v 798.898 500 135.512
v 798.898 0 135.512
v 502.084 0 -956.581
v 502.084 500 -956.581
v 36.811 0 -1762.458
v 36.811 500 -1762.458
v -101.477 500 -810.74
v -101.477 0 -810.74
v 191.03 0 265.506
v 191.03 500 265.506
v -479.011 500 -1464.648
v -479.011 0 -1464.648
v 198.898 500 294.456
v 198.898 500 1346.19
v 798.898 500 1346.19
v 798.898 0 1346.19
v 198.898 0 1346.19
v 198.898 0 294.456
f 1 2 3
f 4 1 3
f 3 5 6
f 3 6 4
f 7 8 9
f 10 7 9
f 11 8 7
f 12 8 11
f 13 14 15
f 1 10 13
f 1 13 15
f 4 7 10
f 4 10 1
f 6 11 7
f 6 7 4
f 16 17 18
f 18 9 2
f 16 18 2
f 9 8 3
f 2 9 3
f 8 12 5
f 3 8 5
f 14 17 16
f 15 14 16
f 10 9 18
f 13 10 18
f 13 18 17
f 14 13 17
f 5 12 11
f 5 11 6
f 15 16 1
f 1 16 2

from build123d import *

# Parameters (mm, degrees)
BOSS_EXTRUDE1_DEPTH = 500
BOSS_EXTRUDE2_DEPTH = 500


with BuildPart() as part:
    # Sketch1 → Boss-Extrude1 (new body)
    with BuildSketch(Plane(origin=(0, 0, 0), x_dir=(1, 0, 0), z_dir=(0, 1, 0))):
        Polygon((-479.010759858, 1464.647663661), (-101.47714403, 810.74025948), (502.083882717, 956.5813546), (36.811056846, 1762.457528389), align=None)
    extrude(amount=BOSS_EXTRUDE1_DEPTH)

    # Sketch1_3 → Boss-Extrude2 (add)
    with BuildSketch(Plane(origin=(0, 0, 0), x_dir=(1, 0, 0), z_dir=(0, 1, 0))):
        Polygon((798.89792549, -1346.189835627), (798.89792549, -135.512175948), (502.083882717, 956.5813546), (-101.47714403, 810.74025948), (198.89792549, -294.455664187), (198.89792549, -1346.189835627), align=None)
    extrude(amount=BOSS_EXTRUDE2_DEPTH)


solid = part.part
